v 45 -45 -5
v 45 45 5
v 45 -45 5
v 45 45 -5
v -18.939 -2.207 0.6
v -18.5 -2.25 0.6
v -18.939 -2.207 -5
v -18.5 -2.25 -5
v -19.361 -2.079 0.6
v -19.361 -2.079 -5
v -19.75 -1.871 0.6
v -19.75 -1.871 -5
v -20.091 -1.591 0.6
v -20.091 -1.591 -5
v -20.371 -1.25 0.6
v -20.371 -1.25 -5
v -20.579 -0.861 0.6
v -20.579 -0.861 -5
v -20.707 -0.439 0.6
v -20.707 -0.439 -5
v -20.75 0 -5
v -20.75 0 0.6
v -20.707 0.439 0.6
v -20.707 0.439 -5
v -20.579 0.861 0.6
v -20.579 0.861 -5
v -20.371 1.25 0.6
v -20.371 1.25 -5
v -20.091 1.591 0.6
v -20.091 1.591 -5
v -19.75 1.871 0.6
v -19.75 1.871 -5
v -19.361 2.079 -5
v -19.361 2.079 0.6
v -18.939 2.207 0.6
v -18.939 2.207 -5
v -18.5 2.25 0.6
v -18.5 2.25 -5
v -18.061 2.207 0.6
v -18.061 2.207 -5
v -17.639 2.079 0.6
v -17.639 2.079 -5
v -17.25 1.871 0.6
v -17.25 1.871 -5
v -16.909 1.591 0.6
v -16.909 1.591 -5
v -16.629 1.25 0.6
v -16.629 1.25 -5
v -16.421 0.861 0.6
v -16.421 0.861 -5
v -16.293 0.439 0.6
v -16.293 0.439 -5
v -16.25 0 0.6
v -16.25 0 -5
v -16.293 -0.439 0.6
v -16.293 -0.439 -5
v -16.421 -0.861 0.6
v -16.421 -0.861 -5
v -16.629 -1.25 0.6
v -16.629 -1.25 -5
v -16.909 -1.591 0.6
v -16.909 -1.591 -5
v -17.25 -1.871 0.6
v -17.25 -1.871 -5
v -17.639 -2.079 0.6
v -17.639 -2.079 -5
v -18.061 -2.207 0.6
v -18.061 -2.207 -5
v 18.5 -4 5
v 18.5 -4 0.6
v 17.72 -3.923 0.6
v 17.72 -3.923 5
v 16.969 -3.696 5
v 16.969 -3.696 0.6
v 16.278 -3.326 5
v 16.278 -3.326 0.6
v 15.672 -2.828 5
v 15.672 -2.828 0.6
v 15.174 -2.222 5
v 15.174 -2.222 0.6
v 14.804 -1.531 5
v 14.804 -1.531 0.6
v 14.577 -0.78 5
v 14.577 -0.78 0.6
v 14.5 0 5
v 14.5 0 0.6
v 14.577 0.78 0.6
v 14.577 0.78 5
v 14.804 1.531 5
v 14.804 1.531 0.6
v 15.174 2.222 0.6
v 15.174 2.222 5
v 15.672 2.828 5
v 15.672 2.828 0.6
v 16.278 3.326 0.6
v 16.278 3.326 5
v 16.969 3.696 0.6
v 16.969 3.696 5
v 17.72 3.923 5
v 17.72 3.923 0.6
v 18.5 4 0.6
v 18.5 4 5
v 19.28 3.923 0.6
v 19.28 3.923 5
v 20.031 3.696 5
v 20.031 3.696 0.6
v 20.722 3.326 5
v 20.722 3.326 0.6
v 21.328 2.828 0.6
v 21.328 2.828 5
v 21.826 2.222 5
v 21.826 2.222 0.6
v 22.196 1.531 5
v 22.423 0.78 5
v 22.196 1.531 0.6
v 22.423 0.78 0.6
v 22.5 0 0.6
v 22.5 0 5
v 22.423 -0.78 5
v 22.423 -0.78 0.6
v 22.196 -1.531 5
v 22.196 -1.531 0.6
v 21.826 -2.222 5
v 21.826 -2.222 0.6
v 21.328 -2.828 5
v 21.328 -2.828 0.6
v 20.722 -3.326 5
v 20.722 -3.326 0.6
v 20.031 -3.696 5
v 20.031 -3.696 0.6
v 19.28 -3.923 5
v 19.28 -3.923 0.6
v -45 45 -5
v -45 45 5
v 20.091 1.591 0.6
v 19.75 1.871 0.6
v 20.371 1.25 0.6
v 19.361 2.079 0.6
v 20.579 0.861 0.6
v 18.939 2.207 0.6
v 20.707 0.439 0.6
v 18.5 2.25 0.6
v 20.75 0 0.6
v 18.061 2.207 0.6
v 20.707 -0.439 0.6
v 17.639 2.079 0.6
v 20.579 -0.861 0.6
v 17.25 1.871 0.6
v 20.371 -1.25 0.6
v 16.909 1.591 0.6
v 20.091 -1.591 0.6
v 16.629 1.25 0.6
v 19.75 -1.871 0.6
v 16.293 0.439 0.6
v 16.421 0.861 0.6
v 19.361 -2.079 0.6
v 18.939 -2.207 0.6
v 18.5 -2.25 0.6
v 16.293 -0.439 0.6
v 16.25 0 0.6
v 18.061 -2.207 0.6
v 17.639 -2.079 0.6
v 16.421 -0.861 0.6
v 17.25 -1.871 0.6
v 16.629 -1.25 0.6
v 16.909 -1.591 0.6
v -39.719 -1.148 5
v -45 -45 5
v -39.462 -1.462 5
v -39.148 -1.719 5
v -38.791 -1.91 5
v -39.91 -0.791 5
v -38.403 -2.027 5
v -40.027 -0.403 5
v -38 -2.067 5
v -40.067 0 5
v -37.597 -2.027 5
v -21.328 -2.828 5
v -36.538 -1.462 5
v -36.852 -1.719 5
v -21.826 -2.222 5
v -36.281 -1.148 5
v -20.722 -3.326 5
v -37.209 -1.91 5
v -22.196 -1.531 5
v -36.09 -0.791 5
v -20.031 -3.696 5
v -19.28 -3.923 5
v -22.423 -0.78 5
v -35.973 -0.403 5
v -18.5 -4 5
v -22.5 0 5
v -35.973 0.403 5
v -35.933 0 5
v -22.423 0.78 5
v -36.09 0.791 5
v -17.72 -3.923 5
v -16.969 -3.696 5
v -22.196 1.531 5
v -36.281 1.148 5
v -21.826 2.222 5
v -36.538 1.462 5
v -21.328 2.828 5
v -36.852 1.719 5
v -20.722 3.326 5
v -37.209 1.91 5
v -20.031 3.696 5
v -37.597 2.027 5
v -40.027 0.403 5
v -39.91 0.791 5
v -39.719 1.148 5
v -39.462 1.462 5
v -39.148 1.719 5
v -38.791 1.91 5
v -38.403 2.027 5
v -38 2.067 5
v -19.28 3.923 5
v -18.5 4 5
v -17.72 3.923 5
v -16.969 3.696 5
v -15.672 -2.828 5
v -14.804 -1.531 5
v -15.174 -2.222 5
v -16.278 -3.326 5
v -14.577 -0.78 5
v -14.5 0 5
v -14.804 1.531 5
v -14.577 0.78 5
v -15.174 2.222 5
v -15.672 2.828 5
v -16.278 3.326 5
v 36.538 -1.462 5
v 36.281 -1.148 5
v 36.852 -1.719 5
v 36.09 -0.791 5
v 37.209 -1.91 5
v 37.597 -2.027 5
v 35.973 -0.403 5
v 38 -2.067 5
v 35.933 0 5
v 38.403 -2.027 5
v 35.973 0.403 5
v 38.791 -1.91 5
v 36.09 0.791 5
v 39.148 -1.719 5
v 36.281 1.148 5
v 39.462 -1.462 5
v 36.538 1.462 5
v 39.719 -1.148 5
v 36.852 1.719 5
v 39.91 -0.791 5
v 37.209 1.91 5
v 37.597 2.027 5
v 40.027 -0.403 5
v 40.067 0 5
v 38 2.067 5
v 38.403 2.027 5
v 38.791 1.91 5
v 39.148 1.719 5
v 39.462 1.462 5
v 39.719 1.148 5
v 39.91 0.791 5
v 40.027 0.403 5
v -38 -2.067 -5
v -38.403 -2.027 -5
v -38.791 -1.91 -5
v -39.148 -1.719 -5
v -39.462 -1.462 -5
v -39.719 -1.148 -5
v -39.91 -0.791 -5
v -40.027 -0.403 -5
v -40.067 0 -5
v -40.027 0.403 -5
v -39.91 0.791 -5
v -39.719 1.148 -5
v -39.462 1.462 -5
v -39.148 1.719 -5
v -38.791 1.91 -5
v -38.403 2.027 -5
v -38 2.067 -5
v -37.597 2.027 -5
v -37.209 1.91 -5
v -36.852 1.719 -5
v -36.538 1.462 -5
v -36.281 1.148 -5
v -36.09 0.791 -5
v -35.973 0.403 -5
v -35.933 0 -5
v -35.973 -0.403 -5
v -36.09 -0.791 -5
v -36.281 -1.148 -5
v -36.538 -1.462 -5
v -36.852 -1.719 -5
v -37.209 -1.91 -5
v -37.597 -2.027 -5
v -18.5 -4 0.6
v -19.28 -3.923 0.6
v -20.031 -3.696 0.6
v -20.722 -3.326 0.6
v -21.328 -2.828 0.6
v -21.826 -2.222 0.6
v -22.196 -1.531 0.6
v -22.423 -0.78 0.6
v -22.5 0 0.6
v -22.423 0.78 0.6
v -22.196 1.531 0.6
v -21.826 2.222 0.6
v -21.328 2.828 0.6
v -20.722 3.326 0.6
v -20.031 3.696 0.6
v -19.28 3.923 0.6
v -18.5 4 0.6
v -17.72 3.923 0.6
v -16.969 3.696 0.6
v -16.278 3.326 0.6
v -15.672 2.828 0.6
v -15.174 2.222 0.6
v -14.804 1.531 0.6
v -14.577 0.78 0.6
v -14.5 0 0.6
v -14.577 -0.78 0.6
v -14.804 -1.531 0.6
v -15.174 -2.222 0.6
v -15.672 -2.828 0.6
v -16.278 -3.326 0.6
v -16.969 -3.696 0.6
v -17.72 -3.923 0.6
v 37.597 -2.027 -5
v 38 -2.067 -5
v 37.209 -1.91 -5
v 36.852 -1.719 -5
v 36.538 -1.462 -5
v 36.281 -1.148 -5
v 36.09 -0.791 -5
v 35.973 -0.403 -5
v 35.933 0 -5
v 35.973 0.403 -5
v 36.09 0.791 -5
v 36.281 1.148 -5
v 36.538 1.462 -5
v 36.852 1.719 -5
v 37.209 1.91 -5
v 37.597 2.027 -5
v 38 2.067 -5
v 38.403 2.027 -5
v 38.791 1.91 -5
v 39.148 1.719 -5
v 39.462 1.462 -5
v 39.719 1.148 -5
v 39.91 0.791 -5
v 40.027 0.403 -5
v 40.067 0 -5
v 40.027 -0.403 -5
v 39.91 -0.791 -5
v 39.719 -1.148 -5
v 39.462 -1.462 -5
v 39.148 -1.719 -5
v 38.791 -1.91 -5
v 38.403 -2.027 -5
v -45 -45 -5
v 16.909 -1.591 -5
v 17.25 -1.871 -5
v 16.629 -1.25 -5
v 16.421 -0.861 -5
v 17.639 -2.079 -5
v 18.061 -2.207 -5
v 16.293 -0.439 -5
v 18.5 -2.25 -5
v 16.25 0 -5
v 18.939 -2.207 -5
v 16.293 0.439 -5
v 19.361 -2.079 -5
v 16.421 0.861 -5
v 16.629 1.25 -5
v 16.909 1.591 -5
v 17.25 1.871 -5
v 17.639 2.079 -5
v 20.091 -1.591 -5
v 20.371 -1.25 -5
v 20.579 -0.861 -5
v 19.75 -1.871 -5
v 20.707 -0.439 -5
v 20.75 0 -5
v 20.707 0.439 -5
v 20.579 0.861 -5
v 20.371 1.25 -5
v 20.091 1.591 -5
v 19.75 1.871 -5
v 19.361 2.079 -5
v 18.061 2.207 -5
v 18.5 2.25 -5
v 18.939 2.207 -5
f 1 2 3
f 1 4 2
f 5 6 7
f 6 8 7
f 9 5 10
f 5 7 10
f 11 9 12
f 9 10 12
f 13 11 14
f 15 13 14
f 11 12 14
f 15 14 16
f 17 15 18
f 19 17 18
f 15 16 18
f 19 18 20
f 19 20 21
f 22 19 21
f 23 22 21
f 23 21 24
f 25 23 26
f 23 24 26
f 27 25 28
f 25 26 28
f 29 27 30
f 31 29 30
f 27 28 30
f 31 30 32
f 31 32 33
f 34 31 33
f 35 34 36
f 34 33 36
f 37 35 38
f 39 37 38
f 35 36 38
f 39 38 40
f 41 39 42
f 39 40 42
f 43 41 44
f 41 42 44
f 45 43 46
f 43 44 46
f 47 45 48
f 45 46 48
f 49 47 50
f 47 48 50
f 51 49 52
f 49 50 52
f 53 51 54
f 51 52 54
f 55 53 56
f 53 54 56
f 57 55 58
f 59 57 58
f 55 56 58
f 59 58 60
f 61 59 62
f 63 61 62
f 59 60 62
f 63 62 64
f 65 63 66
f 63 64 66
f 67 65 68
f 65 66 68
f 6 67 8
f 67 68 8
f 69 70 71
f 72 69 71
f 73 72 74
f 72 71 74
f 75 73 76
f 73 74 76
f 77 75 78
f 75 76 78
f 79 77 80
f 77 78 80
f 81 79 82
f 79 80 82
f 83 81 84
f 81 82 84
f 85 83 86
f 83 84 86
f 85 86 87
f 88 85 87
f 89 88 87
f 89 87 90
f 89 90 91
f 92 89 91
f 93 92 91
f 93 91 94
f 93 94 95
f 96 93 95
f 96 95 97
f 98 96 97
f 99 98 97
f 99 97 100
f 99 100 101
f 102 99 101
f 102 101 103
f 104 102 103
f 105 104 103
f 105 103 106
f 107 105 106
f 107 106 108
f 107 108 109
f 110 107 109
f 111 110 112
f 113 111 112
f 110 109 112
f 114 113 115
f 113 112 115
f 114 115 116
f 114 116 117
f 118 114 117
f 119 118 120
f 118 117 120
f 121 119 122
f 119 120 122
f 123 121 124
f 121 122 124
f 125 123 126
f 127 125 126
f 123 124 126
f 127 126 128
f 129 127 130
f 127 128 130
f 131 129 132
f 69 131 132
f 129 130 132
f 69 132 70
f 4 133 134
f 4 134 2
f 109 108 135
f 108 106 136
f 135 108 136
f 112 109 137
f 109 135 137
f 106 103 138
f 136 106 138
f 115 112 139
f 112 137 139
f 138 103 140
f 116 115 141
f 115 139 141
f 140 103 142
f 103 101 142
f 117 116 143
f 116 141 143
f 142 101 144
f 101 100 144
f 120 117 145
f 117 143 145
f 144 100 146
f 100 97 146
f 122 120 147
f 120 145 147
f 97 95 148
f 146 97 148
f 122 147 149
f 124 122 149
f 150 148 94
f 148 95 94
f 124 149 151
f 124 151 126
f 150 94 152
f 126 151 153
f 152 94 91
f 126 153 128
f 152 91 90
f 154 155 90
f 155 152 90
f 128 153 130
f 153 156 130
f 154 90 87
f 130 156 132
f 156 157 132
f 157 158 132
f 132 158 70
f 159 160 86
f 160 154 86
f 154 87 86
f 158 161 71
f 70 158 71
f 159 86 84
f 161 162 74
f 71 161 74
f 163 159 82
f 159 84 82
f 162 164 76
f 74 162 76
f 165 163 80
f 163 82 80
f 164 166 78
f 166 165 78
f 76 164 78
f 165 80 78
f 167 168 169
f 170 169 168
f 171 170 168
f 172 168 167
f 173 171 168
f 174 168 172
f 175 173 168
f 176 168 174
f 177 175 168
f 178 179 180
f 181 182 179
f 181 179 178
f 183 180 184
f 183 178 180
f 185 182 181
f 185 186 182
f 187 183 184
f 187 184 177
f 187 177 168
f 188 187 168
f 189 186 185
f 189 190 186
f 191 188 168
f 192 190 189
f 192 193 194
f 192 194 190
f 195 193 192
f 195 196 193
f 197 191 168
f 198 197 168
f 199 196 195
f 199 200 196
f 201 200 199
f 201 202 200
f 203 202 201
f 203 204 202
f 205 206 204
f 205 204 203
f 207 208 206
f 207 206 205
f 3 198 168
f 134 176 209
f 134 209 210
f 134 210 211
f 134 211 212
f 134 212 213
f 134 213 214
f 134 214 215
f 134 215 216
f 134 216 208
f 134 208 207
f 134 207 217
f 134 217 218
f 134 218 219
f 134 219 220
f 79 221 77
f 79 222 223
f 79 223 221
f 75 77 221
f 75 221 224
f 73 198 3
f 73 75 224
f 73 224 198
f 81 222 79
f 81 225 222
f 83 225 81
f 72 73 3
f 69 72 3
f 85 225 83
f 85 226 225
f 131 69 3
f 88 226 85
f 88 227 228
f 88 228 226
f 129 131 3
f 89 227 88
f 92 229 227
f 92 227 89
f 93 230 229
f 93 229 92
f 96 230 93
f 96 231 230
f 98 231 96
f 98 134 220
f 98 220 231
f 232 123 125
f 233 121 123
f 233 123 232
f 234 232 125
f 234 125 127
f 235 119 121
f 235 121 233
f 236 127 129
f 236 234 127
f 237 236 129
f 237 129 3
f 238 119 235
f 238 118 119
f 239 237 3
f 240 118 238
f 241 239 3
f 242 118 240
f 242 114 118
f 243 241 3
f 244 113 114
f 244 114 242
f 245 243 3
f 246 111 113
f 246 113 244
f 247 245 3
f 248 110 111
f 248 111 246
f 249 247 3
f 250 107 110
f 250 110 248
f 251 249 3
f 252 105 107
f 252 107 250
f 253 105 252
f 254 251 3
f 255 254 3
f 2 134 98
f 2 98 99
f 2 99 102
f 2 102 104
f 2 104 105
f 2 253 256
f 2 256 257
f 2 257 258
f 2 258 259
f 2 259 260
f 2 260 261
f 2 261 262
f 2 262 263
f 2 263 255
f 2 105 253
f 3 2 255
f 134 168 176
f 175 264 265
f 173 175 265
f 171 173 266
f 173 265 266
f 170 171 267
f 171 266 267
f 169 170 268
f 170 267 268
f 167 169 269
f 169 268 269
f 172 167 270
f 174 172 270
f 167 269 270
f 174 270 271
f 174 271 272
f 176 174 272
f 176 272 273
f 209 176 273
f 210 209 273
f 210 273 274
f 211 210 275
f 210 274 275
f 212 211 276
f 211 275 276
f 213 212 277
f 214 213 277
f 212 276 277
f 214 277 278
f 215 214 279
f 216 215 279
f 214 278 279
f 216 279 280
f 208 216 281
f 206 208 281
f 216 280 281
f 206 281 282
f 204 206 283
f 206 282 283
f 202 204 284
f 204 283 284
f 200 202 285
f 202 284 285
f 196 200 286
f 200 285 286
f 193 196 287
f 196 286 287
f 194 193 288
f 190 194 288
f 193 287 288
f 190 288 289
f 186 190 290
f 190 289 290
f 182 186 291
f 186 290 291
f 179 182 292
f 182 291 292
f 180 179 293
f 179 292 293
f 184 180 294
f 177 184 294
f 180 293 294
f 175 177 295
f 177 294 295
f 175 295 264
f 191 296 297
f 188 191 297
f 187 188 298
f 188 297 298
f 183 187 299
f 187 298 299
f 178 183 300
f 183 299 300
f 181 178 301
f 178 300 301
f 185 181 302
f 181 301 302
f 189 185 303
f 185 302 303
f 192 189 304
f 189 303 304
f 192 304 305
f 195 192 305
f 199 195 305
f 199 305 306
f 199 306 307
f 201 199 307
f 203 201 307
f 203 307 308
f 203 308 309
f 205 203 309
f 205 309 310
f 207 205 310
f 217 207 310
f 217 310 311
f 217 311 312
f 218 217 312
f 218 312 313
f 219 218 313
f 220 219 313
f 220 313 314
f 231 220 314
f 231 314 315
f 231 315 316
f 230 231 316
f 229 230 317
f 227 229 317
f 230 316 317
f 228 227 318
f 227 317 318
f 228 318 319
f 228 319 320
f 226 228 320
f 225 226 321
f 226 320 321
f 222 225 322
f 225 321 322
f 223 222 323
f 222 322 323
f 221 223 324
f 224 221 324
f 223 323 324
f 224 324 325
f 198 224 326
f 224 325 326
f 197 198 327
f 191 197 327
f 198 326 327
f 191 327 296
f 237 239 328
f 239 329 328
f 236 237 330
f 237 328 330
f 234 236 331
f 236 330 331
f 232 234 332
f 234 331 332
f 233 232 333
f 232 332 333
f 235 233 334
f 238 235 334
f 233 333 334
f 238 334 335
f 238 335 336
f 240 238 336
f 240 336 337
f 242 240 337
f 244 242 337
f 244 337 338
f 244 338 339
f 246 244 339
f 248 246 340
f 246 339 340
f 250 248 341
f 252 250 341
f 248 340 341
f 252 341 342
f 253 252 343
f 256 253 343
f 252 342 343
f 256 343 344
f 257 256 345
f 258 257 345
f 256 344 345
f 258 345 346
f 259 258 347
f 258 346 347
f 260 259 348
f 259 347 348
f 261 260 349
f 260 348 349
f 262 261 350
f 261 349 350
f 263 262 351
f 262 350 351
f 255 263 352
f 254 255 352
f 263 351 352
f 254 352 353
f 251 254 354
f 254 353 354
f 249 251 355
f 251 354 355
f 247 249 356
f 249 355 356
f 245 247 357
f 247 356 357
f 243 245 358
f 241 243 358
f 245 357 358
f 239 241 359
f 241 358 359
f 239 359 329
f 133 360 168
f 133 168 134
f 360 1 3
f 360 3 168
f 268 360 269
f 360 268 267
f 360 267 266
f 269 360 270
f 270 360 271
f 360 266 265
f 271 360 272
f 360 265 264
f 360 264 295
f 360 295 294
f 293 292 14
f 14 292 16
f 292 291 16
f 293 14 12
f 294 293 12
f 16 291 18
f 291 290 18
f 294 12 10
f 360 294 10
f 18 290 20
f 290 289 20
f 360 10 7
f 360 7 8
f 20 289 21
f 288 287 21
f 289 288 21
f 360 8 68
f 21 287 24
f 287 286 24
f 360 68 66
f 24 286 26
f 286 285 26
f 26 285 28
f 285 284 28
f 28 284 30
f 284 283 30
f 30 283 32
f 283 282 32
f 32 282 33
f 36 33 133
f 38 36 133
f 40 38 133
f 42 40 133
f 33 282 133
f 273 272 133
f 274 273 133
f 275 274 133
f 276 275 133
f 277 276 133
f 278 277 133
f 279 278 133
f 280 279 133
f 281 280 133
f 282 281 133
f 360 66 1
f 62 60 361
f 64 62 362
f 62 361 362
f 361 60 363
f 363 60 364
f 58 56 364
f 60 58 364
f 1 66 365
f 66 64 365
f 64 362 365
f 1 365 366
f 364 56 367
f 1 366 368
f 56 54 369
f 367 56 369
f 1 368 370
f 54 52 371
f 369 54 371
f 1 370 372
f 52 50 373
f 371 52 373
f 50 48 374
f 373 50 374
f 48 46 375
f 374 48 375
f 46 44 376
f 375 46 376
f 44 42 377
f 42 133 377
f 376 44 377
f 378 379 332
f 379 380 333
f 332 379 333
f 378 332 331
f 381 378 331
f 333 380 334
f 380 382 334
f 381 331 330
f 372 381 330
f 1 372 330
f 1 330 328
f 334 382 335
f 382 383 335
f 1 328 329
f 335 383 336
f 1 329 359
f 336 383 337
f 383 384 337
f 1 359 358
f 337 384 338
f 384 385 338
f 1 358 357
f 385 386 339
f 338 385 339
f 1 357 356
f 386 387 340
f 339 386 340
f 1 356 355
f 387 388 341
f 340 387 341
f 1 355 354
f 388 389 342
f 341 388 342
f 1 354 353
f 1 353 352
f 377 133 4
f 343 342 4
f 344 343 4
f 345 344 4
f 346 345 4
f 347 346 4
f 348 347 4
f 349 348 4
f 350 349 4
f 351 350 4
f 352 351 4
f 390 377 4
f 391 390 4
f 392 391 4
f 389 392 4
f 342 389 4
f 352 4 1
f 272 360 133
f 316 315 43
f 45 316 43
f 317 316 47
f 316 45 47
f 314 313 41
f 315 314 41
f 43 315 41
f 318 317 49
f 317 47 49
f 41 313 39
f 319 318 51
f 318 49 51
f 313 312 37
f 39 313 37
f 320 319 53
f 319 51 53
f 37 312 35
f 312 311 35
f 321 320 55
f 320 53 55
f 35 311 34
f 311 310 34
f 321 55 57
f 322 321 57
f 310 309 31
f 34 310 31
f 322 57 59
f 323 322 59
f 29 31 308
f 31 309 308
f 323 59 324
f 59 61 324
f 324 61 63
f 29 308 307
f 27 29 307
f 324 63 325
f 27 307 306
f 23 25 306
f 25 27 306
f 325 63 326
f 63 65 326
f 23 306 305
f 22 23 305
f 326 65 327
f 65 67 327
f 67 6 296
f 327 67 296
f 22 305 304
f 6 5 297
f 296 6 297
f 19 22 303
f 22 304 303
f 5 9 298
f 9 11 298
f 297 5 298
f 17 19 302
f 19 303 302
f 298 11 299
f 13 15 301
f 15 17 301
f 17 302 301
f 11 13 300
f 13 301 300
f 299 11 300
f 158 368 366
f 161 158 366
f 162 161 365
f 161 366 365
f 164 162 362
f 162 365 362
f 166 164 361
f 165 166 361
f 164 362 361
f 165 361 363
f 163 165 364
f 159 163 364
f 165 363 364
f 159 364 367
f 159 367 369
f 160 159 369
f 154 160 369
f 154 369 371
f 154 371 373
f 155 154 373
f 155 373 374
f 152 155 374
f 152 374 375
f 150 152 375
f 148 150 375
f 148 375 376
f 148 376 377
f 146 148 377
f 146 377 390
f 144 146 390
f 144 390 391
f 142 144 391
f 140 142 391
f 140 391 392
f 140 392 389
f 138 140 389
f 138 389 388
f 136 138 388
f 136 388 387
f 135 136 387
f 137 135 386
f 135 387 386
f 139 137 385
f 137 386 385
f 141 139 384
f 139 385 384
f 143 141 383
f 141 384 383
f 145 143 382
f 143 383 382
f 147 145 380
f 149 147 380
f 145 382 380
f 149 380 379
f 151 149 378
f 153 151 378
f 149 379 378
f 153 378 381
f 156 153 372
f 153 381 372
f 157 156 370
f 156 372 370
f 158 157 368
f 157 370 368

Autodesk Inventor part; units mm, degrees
ref_plane "YZ Plane" through (0, 0, 0) normal (1, 0, 0) x (0, 1, 0)
ref_plane "XZ Plane" through (0, 0, 0) normal (0, 1, 0) x (-1, 0, 0)
ref_plane "XY Plane" through (0, 0, 0) normal (0, 0, 1) x (1, 0, 0)
sketch "Skizze_Grundkörper" plane through (0, 0, 0) normal (0, 0, 1) x (1, 0, 0)
  line L0 (-63, 0) -> (63, 0) projected
  line L1 (0, -63) -> (0, 63) projected
  line L2 (45, -45) -> (-45, -45)
  line L3 (-45, -45) -> (-45, 45)
  line L4 (-45, 45) -> (45, 45)
  line L5 (45, 45) -> (45, -45)
  line L6 (45, -45) -> (-45, 45) construction
  line L7 (-45, -45) -> (45, 45) construction
  point P0 (0, 0)
  dimension "Breite" = 90
  dimension "Länge" = 90
extrude "Grundkörper" add sketch "Skizze_Grundkörper" along normal mid plane 10
sketch "Skizze_Senkbohrung" plane through (0, 0, 5) normal (0, 0, 1) x (1, 0, 0)
  line L0 (-63, 0) -> (63, 0) projected
  line L1 (0, -63) -> (0, 63) projected
  point P0 (0, 0)
  point P1 (-18.5, 0)
  point P2 (18.5, 0)
  dimension "Senkbohrung_Abstand" = 37
hole "Senkbohrung" at (-18.5, 0, 5) at (18.5, 0, 5) direction (0, 0, -1) diameter 4.5 end through all counterbore diameter 8 counterbore depth 4.4
sketch "Skizze_Gewindebohrung_M5" plane through (0, 0, 5) normal (0, 0, 1) x (1, 0, 0)
  line L0 (-63, 0) -> (63, 0) projected
  line L1 (0, -63) -> (0, 63) projected
  point P0 (0, 0)
  point P1 (-38, 0)
  point P2 (38, 0)
  dimension "Gewindeabstand" = 76
hole "Gewindebohrung_M5" at (-38, 0, 5) at (38, 0, 5) direction (0, 0, -1) diameter 4.134 end through all thread size "M5x0.8" class "6H" standard "ISO Metric profile"
properties part number "Grundplatte_2016_iLogic"
